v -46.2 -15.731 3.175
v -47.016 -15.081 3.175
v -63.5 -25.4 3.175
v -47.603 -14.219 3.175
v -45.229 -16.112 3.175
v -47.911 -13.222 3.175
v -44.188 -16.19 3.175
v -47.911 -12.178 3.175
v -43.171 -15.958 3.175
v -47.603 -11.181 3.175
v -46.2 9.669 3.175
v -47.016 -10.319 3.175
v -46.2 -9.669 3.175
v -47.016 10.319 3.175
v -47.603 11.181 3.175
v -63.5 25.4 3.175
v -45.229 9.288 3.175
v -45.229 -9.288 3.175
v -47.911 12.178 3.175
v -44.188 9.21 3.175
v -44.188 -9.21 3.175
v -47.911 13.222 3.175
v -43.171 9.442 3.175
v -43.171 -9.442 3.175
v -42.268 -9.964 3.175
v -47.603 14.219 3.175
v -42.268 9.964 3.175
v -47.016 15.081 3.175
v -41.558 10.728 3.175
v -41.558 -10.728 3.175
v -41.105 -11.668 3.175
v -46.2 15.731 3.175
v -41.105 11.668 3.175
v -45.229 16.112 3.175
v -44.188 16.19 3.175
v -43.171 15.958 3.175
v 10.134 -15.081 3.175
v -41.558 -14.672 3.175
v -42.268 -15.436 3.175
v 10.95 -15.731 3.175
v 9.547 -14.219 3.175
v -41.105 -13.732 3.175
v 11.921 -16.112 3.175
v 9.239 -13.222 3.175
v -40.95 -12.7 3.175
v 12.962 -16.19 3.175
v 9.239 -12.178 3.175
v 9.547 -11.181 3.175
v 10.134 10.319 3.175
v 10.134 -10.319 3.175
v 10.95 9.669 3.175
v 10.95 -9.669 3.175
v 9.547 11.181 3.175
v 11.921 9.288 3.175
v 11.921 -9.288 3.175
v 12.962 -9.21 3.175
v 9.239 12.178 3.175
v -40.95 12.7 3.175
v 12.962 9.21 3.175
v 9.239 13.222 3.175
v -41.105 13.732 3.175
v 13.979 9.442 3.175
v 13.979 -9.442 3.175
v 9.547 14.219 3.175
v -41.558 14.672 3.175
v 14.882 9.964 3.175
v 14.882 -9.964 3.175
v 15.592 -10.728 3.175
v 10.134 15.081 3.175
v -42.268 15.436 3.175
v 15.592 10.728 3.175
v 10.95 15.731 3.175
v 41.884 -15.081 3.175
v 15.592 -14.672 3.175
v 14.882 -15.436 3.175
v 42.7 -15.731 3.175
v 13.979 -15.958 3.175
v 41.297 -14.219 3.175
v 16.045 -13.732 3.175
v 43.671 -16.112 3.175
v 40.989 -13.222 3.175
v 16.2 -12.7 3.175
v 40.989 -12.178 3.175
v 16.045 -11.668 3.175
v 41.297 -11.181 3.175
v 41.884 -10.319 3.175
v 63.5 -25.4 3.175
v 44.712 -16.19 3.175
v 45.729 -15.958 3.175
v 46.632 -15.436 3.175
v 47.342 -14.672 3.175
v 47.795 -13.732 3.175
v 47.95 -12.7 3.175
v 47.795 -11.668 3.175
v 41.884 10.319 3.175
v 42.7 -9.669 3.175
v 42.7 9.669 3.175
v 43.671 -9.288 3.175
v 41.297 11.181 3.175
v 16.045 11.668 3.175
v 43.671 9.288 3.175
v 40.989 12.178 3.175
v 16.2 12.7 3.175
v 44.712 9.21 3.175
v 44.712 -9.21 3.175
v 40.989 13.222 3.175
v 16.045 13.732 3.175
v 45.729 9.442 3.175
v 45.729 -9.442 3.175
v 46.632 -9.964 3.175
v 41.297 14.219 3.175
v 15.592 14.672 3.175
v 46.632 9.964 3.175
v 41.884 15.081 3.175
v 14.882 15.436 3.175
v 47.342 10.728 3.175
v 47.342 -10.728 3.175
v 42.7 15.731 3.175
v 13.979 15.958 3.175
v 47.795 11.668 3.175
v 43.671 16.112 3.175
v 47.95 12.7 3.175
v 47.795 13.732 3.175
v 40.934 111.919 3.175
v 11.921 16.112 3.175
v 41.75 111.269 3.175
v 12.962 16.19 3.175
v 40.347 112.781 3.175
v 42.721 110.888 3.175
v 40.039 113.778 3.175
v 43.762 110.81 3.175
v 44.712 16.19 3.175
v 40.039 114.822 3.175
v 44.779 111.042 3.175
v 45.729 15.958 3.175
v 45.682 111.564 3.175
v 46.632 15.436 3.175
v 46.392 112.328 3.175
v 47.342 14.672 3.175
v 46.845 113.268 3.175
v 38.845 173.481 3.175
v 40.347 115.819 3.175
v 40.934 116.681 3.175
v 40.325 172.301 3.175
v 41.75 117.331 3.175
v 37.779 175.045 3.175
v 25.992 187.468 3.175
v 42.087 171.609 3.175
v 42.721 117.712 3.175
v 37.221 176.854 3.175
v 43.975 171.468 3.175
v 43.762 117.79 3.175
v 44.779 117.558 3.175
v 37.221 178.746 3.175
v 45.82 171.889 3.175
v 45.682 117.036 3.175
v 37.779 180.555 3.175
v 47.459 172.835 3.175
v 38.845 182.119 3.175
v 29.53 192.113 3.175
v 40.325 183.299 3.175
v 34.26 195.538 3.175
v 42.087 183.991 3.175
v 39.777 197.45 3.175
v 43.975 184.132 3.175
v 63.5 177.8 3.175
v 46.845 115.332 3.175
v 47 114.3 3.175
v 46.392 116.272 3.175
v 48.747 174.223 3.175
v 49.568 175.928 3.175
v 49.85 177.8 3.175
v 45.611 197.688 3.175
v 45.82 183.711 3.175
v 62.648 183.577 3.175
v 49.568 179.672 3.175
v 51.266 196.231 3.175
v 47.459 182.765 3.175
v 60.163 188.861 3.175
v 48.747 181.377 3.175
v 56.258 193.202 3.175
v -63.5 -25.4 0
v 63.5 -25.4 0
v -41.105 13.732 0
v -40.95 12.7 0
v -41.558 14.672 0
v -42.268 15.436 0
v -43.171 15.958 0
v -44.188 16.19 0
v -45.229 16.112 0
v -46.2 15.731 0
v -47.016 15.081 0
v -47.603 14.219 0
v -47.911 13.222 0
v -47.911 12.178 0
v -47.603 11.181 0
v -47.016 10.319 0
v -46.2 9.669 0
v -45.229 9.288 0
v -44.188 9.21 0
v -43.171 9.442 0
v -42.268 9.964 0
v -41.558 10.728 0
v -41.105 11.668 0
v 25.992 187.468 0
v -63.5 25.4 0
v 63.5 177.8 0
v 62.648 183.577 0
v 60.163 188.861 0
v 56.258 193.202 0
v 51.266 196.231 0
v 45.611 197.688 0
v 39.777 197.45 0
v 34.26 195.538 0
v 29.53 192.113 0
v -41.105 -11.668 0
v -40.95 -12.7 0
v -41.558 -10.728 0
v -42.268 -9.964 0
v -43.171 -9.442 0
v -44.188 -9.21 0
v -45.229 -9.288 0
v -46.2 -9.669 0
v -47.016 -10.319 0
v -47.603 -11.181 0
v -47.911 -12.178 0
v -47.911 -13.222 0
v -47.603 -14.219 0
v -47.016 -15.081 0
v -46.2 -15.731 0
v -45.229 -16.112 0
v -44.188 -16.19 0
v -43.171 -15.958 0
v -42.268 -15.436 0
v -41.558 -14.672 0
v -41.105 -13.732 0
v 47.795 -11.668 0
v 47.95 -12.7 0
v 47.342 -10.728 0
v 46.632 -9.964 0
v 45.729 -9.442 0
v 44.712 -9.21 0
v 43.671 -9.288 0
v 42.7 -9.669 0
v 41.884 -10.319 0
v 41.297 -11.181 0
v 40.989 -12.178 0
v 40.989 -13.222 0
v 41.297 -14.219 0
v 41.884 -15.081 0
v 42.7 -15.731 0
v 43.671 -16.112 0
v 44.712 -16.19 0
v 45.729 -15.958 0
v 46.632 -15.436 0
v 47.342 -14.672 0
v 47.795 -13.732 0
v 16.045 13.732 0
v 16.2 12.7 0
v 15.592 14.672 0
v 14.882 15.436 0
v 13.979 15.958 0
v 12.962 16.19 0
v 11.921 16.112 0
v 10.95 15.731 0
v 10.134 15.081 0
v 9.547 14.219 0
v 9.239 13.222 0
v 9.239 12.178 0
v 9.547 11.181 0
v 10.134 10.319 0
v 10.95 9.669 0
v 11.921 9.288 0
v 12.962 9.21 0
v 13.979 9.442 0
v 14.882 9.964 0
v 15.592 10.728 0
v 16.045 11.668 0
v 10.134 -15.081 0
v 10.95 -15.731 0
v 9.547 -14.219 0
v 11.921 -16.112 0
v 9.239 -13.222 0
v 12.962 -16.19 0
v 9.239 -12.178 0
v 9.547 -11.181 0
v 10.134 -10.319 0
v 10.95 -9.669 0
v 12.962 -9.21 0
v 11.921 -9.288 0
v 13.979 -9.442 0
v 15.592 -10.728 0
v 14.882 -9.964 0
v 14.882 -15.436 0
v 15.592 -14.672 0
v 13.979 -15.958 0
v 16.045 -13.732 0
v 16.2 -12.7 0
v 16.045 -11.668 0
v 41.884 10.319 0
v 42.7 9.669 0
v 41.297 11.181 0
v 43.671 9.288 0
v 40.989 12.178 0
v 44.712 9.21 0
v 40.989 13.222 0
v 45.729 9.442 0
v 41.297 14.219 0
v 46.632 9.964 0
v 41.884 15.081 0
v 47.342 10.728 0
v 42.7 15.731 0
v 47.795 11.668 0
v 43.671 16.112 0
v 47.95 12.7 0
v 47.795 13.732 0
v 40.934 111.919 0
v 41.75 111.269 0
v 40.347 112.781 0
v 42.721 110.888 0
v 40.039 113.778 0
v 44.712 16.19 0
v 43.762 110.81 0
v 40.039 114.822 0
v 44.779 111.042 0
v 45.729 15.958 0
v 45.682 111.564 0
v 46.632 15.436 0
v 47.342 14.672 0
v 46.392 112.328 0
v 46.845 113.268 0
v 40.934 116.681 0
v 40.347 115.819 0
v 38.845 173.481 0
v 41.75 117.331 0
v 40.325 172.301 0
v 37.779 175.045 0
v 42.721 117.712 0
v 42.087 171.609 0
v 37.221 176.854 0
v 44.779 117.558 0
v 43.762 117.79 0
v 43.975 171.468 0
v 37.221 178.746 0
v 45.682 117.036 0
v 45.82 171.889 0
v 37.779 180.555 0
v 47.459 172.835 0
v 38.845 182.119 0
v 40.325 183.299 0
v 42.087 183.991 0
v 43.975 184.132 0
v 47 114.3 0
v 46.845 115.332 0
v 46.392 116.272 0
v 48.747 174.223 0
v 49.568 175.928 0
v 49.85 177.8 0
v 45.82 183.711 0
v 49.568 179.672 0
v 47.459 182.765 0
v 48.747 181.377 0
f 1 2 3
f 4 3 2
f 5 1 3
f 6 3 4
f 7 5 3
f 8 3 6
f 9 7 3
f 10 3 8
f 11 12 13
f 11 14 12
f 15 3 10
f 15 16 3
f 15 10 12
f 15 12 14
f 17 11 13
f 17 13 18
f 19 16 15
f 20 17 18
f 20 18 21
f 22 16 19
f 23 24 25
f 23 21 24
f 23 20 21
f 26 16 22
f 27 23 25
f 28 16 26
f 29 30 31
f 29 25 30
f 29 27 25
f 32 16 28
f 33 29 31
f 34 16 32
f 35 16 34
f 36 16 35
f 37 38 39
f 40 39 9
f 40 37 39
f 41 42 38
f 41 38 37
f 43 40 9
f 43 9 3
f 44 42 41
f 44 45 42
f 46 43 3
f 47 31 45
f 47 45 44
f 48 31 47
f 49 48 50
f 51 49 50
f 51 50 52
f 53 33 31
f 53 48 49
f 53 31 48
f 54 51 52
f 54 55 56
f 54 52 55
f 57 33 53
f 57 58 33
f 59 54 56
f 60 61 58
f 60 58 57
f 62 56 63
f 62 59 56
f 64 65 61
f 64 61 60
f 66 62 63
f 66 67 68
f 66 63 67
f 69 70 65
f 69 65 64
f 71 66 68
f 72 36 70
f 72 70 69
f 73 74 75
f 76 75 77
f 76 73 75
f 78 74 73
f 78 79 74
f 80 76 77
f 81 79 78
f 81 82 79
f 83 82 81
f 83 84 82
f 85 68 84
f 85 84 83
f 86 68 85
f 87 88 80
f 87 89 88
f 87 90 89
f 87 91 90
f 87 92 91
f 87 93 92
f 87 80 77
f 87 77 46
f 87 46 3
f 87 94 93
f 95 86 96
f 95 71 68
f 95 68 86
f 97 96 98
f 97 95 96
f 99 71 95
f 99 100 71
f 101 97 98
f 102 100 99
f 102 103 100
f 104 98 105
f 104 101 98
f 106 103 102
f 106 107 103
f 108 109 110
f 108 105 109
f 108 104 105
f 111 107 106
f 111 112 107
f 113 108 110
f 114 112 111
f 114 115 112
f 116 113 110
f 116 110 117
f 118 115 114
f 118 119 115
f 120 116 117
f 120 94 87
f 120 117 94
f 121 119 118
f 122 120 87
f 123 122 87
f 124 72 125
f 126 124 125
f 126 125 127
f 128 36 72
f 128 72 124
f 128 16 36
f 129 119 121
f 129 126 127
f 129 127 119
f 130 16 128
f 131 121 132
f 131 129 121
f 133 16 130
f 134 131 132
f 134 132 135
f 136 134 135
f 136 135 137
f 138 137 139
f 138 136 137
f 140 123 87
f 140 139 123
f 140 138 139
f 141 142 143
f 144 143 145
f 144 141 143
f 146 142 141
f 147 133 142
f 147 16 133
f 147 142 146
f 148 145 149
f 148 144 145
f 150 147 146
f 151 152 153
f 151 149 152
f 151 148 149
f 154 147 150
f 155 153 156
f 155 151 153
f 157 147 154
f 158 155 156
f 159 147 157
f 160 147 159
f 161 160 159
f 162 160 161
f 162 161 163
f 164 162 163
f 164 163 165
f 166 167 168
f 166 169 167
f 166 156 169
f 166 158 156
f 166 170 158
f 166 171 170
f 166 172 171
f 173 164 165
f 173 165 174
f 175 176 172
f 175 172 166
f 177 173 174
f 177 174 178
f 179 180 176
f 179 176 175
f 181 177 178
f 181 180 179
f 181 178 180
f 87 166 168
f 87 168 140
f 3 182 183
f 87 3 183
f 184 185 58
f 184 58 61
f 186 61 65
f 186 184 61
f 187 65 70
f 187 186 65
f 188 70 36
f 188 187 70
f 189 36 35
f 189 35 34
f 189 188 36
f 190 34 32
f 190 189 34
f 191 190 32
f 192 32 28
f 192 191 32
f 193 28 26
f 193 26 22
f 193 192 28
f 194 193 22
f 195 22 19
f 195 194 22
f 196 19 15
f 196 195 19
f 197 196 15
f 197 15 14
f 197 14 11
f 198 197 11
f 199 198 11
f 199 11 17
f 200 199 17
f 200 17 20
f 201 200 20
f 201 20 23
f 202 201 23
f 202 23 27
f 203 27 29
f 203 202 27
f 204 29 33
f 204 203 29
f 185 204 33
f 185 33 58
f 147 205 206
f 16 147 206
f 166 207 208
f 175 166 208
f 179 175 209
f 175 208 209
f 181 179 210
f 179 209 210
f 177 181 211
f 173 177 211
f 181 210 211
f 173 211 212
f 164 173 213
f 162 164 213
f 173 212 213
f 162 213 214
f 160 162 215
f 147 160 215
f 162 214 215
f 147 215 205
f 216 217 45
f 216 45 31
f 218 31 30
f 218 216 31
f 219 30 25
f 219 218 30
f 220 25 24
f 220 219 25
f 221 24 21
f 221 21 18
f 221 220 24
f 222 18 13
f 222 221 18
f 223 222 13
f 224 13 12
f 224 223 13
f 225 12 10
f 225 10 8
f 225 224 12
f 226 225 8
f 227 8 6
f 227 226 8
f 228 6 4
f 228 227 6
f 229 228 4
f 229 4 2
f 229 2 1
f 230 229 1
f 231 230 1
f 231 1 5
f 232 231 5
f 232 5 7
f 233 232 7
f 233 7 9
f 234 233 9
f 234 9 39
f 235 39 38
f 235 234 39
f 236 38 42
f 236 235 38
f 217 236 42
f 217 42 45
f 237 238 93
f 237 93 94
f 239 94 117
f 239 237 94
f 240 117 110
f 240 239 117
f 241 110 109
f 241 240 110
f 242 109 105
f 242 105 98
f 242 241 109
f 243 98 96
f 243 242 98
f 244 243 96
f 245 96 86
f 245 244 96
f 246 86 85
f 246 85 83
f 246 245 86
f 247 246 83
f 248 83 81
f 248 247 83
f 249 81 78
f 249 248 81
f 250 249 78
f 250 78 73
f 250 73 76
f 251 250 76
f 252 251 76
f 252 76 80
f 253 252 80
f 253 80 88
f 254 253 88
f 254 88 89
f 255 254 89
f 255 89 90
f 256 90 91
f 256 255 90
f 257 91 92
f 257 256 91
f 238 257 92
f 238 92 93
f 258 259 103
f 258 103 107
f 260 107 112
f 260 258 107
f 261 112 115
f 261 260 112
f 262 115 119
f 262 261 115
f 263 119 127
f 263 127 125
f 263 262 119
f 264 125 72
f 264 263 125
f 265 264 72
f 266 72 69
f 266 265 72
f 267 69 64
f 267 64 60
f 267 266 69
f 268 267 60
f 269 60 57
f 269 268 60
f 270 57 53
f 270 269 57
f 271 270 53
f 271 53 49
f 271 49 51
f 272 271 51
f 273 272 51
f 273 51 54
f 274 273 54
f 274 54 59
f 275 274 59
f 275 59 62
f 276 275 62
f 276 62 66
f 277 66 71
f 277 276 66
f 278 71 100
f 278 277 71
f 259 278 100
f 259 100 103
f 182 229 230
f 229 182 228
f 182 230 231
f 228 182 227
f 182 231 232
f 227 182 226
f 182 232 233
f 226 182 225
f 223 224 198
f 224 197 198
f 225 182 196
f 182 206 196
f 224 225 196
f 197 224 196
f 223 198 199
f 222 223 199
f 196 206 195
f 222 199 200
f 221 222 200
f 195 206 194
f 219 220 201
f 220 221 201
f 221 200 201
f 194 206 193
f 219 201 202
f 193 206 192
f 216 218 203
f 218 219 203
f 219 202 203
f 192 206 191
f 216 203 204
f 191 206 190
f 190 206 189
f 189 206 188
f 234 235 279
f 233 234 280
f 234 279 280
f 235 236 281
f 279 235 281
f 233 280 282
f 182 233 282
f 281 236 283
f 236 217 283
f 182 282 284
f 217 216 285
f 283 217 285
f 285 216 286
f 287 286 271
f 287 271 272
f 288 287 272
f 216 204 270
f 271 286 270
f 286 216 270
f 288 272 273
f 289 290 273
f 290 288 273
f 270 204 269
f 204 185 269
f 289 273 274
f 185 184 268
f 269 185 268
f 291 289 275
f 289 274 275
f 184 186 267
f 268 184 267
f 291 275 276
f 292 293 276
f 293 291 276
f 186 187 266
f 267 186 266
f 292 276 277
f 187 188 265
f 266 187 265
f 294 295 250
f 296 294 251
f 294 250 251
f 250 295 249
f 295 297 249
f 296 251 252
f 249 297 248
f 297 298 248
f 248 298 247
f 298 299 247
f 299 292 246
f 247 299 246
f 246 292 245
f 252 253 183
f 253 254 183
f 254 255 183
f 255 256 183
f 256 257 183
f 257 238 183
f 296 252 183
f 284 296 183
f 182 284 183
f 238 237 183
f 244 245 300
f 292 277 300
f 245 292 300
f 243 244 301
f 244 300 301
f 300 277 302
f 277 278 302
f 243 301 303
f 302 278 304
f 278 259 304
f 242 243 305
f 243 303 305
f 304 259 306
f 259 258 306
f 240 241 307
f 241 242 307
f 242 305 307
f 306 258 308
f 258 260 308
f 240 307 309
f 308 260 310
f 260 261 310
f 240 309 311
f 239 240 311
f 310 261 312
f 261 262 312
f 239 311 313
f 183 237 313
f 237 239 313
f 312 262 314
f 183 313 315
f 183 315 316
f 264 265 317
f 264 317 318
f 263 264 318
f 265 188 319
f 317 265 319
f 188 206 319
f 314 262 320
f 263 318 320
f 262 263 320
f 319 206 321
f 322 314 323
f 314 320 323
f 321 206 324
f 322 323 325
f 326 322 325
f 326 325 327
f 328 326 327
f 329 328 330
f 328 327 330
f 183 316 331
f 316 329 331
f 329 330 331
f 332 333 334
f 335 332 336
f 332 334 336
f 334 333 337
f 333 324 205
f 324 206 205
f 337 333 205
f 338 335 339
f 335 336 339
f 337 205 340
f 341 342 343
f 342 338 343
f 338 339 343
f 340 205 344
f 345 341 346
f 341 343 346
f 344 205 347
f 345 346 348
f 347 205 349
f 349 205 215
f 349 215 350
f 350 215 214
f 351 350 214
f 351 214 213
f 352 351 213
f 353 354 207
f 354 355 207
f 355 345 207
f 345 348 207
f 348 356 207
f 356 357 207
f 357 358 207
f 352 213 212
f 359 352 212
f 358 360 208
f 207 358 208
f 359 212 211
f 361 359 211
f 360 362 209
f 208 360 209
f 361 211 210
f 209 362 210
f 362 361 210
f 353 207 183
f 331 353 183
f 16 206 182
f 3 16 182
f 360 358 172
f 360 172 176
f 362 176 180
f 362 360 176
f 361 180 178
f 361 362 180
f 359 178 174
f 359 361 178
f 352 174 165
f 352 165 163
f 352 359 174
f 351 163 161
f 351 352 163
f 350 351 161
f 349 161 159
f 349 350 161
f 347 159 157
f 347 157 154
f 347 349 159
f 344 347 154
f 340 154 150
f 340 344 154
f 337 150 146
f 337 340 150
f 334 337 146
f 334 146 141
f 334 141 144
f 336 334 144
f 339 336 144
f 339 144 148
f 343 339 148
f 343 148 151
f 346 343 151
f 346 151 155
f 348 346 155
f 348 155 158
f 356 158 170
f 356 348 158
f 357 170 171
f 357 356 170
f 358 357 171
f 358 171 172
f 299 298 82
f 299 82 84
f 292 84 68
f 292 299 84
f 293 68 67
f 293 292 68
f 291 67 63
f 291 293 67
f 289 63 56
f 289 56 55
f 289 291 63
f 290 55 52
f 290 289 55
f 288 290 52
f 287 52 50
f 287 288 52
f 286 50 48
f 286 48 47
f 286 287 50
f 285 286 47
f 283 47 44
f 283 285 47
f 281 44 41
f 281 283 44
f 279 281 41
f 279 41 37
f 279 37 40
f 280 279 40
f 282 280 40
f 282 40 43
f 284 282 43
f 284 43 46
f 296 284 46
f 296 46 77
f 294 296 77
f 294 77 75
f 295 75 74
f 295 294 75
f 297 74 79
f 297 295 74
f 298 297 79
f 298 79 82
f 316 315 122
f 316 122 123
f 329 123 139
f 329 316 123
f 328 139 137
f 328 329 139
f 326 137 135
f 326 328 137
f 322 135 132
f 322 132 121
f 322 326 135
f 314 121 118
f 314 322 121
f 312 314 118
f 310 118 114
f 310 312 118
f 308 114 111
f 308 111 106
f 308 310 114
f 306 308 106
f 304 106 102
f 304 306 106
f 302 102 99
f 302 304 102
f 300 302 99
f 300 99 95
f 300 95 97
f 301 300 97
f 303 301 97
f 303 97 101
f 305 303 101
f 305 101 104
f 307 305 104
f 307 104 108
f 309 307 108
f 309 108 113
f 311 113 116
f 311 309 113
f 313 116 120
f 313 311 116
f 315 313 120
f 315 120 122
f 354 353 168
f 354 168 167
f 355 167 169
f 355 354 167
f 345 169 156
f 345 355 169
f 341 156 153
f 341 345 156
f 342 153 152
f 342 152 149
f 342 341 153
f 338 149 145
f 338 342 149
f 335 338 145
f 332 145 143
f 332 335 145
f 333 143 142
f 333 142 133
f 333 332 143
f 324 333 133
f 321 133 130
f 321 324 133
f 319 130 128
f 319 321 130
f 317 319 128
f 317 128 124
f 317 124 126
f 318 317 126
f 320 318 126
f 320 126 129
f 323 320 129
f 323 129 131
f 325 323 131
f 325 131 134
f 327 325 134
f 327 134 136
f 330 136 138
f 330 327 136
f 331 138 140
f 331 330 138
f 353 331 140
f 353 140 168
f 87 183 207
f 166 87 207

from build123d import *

# Parameters (mm, degrees)
SKETCH1_R           = 6.35
SKETCH1_R_2         = 3.5
BOSS_EXTRUDE1_DEPTH = 3.175


with BuildPart() as part:
    # Sketch1 → Boss-Extrude1 (new body)
    with BuildSketch(Plane.XY):
        with BuildLine():
            Line((-63.5, -25.4), (63.5, -25.4))
            Line((63.5, -25.4), (63.5, 177.8))
            ThreePointArc((63.5, 177.8), (48.491876086, 197.167012499), (25.991882686, 187.467772655))
            Line((25.991882686, 187.467772655), (-63.5, 25.4))
            Line((-63.5, 25.4), (-63.5, -25.4))
        make_face()
        with Locations((43.5, 177.8)):
            Circle(SKETCH1_R, mode=Mode.SUBTRACT)
        with Locations((-44.45, 12.7)):
            Circle(SKETCH1_R_2, mode=Mode.SUBTRACT)
        with Locations((44.45, 12.7)):
            Circle(SKETCH1_R_2, mode=Mode.SUBTRACT)
        with Locations((44.45, -12.7)):
            Circle(SKETCH1_R_2, mode=Mode.SUBTRACT)
        with Locations((-44.45, -12.7)):
            Circle(SKETCH1_R_2, mode=Mode.SUBTRACT)
        with Locations((12.7, 12.7)):
            Circle(SKETCH1_R_2, mode=Mode.SUBTRACT)
        with Locations((12.7, -12.7)):
            Circle(SKETCH1_R_2, mode=Mode.SUBTRACT)
        with Locations((43.5, 114.3)):
            Circle(SKETCH1_R_2, mode=Mode.SUBTRACT)
    extrude(amount=BOSS_EXTRUDE1_DEPTH)


solid = part.part
